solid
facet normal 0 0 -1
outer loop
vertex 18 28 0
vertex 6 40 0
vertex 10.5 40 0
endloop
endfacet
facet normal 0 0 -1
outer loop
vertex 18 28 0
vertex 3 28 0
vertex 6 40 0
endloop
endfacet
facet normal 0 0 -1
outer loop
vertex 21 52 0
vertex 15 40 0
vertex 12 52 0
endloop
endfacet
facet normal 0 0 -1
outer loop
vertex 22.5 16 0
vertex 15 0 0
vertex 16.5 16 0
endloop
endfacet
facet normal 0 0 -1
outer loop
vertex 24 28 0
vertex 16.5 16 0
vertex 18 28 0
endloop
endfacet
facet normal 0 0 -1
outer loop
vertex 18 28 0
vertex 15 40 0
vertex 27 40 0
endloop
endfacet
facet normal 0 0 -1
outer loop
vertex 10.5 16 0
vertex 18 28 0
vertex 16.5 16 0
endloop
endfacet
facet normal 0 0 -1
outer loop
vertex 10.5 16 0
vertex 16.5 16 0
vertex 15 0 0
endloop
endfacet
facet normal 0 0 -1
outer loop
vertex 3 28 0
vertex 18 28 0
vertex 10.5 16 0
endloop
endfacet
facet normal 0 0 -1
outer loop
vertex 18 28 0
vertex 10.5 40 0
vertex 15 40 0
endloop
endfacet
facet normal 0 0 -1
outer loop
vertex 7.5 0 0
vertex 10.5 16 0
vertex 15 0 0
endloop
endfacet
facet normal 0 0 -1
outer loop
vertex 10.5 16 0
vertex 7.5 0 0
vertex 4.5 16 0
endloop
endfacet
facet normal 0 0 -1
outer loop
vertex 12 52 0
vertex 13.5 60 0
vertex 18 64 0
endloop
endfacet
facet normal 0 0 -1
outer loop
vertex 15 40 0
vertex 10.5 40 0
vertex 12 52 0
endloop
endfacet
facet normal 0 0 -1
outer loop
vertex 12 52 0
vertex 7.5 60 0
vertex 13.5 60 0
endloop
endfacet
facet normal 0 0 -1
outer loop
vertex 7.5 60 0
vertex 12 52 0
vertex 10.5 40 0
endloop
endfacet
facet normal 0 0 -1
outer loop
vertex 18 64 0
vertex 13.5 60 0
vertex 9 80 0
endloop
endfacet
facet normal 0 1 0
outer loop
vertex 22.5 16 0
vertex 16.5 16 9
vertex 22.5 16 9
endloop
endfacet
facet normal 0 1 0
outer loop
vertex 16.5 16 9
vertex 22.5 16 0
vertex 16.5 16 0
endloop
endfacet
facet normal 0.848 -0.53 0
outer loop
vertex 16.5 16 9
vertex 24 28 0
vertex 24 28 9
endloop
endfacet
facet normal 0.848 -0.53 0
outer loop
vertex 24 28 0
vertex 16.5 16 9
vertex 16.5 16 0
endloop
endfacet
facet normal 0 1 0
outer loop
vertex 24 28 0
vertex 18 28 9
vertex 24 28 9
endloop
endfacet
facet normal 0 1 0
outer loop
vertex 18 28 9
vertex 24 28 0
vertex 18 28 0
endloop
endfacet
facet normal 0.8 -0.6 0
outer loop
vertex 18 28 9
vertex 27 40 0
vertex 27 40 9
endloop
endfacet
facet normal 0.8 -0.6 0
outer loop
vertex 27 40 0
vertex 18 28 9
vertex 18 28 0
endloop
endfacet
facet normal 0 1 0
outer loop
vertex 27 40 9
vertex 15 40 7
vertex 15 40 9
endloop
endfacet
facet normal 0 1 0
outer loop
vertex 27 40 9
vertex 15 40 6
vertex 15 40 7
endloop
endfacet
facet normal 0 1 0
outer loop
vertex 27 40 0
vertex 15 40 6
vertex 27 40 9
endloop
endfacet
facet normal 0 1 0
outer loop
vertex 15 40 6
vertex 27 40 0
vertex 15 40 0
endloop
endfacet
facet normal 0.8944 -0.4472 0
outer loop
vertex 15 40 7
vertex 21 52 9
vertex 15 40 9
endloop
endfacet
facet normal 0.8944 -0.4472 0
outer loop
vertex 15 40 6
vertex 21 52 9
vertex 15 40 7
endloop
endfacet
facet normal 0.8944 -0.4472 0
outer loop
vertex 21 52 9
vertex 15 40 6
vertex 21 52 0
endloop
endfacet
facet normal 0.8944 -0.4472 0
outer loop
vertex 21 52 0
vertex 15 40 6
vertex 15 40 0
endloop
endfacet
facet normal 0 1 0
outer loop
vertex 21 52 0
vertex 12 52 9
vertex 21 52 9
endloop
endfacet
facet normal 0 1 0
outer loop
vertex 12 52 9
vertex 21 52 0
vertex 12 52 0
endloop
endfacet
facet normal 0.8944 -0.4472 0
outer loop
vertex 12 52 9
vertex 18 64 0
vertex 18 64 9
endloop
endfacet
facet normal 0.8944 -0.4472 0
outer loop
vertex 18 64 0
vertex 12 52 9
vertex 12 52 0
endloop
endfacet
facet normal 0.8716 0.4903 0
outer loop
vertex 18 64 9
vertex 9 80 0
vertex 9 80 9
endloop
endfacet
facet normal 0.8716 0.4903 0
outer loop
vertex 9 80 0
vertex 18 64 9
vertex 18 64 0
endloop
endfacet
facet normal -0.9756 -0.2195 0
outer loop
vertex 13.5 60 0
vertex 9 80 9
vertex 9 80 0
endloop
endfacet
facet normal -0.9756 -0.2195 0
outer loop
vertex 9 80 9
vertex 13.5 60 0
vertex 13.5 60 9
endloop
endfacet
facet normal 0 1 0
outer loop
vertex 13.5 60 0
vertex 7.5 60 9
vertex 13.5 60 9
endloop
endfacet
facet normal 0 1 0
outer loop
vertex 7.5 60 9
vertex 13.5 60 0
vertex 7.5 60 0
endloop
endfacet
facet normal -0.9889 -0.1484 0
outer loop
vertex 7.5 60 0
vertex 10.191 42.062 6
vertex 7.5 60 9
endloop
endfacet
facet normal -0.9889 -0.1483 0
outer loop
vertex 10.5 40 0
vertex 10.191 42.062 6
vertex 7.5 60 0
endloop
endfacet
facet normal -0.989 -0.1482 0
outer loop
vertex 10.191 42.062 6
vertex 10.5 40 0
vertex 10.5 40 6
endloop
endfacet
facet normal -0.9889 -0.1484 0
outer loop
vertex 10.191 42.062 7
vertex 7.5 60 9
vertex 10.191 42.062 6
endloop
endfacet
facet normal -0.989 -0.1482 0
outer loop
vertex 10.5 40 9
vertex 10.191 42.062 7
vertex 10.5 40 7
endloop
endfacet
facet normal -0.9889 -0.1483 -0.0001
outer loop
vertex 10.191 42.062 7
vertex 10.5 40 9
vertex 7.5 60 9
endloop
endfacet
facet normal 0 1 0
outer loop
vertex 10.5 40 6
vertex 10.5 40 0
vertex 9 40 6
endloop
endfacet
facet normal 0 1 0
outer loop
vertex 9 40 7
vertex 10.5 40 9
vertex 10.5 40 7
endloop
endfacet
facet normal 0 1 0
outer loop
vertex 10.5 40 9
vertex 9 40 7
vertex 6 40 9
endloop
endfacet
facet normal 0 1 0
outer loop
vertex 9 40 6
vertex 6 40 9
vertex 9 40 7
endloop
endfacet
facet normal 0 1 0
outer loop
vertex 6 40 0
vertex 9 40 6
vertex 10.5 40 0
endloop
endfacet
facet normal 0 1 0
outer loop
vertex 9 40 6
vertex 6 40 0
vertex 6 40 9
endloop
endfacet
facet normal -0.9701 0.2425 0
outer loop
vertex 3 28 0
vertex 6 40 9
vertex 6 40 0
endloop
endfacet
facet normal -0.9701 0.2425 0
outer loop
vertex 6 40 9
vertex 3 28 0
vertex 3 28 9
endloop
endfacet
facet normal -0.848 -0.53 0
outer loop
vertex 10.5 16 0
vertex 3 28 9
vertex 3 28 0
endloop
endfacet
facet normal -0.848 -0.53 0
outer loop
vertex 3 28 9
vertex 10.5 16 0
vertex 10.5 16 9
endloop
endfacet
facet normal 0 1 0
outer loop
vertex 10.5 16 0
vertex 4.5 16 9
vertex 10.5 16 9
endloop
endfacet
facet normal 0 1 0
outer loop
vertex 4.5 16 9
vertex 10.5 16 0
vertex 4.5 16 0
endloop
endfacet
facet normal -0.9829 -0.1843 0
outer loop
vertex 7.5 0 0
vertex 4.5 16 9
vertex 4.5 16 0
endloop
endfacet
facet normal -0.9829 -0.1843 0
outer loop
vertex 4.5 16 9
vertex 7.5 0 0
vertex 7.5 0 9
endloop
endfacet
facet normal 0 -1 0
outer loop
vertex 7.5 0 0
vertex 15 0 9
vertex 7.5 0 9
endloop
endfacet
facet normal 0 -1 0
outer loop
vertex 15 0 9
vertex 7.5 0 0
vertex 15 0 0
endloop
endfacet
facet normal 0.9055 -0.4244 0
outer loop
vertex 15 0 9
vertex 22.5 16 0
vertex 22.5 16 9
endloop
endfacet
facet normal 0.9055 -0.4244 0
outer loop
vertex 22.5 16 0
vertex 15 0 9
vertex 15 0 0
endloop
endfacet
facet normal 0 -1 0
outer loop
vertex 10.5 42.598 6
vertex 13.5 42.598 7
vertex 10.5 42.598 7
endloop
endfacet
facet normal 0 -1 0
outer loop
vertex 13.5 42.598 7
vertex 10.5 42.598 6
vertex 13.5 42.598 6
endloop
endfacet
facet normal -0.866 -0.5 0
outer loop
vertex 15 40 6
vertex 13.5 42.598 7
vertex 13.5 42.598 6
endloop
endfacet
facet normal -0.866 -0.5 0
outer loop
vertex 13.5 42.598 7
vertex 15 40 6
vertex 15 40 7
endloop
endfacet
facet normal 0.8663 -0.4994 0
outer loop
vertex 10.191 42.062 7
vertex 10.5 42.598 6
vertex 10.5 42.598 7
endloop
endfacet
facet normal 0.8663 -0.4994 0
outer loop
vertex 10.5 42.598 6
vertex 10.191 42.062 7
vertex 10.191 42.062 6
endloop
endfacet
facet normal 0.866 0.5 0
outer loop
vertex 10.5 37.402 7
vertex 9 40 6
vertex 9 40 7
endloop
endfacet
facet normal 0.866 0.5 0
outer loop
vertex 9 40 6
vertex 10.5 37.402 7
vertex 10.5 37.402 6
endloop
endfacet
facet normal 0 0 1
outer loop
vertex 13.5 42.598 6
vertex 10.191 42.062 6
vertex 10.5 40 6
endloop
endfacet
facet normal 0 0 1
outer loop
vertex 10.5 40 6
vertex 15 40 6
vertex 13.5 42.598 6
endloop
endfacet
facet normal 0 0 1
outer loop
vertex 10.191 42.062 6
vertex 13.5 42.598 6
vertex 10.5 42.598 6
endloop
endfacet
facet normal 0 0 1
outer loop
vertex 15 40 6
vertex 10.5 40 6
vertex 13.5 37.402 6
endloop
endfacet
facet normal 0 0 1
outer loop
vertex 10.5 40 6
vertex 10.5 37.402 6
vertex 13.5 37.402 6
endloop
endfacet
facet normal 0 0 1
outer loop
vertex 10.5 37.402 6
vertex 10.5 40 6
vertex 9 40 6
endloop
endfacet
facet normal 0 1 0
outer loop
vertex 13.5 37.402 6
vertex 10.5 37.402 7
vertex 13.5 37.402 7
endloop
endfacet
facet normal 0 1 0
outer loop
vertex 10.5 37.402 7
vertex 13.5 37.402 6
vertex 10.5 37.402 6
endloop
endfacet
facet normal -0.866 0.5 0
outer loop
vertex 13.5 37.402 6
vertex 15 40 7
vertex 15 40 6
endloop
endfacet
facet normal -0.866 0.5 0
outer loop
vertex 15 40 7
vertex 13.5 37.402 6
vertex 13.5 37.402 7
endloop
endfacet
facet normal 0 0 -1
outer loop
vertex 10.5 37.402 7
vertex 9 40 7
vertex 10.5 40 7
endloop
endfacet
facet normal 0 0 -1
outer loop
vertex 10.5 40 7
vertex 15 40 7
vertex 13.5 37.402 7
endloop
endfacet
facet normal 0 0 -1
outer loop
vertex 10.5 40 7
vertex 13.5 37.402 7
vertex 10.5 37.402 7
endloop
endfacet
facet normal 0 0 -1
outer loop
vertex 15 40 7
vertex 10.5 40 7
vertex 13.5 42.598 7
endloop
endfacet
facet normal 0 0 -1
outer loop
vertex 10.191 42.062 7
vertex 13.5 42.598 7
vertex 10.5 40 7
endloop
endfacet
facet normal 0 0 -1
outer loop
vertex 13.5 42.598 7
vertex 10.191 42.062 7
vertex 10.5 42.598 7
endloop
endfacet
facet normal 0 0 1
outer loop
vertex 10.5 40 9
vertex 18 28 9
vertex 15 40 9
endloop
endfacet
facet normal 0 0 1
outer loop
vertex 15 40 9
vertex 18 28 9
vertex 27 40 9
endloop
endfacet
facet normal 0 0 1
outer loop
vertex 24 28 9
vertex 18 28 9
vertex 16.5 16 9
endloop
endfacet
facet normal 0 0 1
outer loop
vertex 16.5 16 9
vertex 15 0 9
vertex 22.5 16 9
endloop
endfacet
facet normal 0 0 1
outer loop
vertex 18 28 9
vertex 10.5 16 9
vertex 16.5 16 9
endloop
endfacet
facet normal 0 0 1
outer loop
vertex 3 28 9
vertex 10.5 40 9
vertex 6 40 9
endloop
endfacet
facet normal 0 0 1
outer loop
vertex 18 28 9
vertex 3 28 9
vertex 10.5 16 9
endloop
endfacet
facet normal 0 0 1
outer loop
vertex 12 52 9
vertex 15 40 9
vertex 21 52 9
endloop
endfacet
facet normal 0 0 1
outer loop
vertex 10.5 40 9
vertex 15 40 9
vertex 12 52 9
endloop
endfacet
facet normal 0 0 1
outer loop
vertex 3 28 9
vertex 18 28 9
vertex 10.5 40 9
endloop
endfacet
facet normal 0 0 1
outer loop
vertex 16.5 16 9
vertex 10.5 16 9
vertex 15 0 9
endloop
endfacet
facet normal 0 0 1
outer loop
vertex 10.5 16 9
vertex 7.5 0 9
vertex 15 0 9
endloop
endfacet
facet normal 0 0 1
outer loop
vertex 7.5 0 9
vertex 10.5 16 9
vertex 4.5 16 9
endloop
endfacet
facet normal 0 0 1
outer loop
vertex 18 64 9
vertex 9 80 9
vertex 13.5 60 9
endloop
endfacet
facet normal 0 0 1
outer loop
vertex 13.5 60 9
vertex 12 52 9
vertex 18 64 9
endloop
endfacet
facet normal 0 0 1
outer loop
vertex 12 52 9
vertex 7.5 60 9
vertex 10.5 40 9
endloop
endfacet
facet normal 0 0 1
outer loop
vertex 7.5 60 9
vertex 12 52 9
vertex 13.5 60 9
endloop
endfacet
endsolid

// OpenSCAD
// PERCY UNIT - Lightning Bolt Emblem
// OpenSCAD file - export to STL for 3D printing

// Parameters
bolt_width = 30;
bolt_height = 80;
bolt_depth = 8;

// Classic Percy lightning bolt shape
module lightning_bolt(w, h, d) {
    linear_extrude(height=d) {
        polygon(points=[
            [w*0.5, 0],           // bottom center
            [w*0.75, h*0.2],      // right upper
            [w*0.55, h*0.2],      // notch in
            [w*0.8, h*0.35],      // right mid
            [w*0.6, h*0.35],      // notch in
            [w*0.9, h*0.5],       // right upper mid
            [w*0.5, h*0.5],       // notch in
            [w*0.7, h*0.65],      // right notch
            [w*0.4, h*0.65],      // notch in
            [w*0.6, h*0.8],       // right upper
            [w*0.3, h*1],         // tip of bolt
            [w*0.45, h*0.75],     // notch
            [w*0.25, h*0.75],     // notch
            [w*0.35, h*0.5],      // left upper mid
            [w*0.2, h*0.5],       // notch
            [w*0.1, h*0.35],      // left upper
            [w*0.35, h*0.2],      // notch
            [w*0.15, h*0.2],      // left notch
            [w*0.25, 0]           // bottom left
        ]);
    }
}

difference() {
    lightning_bolt(bolt_width, bolt_height, bolt_depth);
    
    // Hex bolt hole for mounting
    translate([bolt_width*0.4, bolt_height*0.5, bolt_depth - 2])
        cylinder(d=6, h=4, $fn=6);
}

// Edge chamfer for smooth look
translate([0, 0, bolt_depth - 1])
    lightning_bolt(bolt_width, bolt_height, 2);
